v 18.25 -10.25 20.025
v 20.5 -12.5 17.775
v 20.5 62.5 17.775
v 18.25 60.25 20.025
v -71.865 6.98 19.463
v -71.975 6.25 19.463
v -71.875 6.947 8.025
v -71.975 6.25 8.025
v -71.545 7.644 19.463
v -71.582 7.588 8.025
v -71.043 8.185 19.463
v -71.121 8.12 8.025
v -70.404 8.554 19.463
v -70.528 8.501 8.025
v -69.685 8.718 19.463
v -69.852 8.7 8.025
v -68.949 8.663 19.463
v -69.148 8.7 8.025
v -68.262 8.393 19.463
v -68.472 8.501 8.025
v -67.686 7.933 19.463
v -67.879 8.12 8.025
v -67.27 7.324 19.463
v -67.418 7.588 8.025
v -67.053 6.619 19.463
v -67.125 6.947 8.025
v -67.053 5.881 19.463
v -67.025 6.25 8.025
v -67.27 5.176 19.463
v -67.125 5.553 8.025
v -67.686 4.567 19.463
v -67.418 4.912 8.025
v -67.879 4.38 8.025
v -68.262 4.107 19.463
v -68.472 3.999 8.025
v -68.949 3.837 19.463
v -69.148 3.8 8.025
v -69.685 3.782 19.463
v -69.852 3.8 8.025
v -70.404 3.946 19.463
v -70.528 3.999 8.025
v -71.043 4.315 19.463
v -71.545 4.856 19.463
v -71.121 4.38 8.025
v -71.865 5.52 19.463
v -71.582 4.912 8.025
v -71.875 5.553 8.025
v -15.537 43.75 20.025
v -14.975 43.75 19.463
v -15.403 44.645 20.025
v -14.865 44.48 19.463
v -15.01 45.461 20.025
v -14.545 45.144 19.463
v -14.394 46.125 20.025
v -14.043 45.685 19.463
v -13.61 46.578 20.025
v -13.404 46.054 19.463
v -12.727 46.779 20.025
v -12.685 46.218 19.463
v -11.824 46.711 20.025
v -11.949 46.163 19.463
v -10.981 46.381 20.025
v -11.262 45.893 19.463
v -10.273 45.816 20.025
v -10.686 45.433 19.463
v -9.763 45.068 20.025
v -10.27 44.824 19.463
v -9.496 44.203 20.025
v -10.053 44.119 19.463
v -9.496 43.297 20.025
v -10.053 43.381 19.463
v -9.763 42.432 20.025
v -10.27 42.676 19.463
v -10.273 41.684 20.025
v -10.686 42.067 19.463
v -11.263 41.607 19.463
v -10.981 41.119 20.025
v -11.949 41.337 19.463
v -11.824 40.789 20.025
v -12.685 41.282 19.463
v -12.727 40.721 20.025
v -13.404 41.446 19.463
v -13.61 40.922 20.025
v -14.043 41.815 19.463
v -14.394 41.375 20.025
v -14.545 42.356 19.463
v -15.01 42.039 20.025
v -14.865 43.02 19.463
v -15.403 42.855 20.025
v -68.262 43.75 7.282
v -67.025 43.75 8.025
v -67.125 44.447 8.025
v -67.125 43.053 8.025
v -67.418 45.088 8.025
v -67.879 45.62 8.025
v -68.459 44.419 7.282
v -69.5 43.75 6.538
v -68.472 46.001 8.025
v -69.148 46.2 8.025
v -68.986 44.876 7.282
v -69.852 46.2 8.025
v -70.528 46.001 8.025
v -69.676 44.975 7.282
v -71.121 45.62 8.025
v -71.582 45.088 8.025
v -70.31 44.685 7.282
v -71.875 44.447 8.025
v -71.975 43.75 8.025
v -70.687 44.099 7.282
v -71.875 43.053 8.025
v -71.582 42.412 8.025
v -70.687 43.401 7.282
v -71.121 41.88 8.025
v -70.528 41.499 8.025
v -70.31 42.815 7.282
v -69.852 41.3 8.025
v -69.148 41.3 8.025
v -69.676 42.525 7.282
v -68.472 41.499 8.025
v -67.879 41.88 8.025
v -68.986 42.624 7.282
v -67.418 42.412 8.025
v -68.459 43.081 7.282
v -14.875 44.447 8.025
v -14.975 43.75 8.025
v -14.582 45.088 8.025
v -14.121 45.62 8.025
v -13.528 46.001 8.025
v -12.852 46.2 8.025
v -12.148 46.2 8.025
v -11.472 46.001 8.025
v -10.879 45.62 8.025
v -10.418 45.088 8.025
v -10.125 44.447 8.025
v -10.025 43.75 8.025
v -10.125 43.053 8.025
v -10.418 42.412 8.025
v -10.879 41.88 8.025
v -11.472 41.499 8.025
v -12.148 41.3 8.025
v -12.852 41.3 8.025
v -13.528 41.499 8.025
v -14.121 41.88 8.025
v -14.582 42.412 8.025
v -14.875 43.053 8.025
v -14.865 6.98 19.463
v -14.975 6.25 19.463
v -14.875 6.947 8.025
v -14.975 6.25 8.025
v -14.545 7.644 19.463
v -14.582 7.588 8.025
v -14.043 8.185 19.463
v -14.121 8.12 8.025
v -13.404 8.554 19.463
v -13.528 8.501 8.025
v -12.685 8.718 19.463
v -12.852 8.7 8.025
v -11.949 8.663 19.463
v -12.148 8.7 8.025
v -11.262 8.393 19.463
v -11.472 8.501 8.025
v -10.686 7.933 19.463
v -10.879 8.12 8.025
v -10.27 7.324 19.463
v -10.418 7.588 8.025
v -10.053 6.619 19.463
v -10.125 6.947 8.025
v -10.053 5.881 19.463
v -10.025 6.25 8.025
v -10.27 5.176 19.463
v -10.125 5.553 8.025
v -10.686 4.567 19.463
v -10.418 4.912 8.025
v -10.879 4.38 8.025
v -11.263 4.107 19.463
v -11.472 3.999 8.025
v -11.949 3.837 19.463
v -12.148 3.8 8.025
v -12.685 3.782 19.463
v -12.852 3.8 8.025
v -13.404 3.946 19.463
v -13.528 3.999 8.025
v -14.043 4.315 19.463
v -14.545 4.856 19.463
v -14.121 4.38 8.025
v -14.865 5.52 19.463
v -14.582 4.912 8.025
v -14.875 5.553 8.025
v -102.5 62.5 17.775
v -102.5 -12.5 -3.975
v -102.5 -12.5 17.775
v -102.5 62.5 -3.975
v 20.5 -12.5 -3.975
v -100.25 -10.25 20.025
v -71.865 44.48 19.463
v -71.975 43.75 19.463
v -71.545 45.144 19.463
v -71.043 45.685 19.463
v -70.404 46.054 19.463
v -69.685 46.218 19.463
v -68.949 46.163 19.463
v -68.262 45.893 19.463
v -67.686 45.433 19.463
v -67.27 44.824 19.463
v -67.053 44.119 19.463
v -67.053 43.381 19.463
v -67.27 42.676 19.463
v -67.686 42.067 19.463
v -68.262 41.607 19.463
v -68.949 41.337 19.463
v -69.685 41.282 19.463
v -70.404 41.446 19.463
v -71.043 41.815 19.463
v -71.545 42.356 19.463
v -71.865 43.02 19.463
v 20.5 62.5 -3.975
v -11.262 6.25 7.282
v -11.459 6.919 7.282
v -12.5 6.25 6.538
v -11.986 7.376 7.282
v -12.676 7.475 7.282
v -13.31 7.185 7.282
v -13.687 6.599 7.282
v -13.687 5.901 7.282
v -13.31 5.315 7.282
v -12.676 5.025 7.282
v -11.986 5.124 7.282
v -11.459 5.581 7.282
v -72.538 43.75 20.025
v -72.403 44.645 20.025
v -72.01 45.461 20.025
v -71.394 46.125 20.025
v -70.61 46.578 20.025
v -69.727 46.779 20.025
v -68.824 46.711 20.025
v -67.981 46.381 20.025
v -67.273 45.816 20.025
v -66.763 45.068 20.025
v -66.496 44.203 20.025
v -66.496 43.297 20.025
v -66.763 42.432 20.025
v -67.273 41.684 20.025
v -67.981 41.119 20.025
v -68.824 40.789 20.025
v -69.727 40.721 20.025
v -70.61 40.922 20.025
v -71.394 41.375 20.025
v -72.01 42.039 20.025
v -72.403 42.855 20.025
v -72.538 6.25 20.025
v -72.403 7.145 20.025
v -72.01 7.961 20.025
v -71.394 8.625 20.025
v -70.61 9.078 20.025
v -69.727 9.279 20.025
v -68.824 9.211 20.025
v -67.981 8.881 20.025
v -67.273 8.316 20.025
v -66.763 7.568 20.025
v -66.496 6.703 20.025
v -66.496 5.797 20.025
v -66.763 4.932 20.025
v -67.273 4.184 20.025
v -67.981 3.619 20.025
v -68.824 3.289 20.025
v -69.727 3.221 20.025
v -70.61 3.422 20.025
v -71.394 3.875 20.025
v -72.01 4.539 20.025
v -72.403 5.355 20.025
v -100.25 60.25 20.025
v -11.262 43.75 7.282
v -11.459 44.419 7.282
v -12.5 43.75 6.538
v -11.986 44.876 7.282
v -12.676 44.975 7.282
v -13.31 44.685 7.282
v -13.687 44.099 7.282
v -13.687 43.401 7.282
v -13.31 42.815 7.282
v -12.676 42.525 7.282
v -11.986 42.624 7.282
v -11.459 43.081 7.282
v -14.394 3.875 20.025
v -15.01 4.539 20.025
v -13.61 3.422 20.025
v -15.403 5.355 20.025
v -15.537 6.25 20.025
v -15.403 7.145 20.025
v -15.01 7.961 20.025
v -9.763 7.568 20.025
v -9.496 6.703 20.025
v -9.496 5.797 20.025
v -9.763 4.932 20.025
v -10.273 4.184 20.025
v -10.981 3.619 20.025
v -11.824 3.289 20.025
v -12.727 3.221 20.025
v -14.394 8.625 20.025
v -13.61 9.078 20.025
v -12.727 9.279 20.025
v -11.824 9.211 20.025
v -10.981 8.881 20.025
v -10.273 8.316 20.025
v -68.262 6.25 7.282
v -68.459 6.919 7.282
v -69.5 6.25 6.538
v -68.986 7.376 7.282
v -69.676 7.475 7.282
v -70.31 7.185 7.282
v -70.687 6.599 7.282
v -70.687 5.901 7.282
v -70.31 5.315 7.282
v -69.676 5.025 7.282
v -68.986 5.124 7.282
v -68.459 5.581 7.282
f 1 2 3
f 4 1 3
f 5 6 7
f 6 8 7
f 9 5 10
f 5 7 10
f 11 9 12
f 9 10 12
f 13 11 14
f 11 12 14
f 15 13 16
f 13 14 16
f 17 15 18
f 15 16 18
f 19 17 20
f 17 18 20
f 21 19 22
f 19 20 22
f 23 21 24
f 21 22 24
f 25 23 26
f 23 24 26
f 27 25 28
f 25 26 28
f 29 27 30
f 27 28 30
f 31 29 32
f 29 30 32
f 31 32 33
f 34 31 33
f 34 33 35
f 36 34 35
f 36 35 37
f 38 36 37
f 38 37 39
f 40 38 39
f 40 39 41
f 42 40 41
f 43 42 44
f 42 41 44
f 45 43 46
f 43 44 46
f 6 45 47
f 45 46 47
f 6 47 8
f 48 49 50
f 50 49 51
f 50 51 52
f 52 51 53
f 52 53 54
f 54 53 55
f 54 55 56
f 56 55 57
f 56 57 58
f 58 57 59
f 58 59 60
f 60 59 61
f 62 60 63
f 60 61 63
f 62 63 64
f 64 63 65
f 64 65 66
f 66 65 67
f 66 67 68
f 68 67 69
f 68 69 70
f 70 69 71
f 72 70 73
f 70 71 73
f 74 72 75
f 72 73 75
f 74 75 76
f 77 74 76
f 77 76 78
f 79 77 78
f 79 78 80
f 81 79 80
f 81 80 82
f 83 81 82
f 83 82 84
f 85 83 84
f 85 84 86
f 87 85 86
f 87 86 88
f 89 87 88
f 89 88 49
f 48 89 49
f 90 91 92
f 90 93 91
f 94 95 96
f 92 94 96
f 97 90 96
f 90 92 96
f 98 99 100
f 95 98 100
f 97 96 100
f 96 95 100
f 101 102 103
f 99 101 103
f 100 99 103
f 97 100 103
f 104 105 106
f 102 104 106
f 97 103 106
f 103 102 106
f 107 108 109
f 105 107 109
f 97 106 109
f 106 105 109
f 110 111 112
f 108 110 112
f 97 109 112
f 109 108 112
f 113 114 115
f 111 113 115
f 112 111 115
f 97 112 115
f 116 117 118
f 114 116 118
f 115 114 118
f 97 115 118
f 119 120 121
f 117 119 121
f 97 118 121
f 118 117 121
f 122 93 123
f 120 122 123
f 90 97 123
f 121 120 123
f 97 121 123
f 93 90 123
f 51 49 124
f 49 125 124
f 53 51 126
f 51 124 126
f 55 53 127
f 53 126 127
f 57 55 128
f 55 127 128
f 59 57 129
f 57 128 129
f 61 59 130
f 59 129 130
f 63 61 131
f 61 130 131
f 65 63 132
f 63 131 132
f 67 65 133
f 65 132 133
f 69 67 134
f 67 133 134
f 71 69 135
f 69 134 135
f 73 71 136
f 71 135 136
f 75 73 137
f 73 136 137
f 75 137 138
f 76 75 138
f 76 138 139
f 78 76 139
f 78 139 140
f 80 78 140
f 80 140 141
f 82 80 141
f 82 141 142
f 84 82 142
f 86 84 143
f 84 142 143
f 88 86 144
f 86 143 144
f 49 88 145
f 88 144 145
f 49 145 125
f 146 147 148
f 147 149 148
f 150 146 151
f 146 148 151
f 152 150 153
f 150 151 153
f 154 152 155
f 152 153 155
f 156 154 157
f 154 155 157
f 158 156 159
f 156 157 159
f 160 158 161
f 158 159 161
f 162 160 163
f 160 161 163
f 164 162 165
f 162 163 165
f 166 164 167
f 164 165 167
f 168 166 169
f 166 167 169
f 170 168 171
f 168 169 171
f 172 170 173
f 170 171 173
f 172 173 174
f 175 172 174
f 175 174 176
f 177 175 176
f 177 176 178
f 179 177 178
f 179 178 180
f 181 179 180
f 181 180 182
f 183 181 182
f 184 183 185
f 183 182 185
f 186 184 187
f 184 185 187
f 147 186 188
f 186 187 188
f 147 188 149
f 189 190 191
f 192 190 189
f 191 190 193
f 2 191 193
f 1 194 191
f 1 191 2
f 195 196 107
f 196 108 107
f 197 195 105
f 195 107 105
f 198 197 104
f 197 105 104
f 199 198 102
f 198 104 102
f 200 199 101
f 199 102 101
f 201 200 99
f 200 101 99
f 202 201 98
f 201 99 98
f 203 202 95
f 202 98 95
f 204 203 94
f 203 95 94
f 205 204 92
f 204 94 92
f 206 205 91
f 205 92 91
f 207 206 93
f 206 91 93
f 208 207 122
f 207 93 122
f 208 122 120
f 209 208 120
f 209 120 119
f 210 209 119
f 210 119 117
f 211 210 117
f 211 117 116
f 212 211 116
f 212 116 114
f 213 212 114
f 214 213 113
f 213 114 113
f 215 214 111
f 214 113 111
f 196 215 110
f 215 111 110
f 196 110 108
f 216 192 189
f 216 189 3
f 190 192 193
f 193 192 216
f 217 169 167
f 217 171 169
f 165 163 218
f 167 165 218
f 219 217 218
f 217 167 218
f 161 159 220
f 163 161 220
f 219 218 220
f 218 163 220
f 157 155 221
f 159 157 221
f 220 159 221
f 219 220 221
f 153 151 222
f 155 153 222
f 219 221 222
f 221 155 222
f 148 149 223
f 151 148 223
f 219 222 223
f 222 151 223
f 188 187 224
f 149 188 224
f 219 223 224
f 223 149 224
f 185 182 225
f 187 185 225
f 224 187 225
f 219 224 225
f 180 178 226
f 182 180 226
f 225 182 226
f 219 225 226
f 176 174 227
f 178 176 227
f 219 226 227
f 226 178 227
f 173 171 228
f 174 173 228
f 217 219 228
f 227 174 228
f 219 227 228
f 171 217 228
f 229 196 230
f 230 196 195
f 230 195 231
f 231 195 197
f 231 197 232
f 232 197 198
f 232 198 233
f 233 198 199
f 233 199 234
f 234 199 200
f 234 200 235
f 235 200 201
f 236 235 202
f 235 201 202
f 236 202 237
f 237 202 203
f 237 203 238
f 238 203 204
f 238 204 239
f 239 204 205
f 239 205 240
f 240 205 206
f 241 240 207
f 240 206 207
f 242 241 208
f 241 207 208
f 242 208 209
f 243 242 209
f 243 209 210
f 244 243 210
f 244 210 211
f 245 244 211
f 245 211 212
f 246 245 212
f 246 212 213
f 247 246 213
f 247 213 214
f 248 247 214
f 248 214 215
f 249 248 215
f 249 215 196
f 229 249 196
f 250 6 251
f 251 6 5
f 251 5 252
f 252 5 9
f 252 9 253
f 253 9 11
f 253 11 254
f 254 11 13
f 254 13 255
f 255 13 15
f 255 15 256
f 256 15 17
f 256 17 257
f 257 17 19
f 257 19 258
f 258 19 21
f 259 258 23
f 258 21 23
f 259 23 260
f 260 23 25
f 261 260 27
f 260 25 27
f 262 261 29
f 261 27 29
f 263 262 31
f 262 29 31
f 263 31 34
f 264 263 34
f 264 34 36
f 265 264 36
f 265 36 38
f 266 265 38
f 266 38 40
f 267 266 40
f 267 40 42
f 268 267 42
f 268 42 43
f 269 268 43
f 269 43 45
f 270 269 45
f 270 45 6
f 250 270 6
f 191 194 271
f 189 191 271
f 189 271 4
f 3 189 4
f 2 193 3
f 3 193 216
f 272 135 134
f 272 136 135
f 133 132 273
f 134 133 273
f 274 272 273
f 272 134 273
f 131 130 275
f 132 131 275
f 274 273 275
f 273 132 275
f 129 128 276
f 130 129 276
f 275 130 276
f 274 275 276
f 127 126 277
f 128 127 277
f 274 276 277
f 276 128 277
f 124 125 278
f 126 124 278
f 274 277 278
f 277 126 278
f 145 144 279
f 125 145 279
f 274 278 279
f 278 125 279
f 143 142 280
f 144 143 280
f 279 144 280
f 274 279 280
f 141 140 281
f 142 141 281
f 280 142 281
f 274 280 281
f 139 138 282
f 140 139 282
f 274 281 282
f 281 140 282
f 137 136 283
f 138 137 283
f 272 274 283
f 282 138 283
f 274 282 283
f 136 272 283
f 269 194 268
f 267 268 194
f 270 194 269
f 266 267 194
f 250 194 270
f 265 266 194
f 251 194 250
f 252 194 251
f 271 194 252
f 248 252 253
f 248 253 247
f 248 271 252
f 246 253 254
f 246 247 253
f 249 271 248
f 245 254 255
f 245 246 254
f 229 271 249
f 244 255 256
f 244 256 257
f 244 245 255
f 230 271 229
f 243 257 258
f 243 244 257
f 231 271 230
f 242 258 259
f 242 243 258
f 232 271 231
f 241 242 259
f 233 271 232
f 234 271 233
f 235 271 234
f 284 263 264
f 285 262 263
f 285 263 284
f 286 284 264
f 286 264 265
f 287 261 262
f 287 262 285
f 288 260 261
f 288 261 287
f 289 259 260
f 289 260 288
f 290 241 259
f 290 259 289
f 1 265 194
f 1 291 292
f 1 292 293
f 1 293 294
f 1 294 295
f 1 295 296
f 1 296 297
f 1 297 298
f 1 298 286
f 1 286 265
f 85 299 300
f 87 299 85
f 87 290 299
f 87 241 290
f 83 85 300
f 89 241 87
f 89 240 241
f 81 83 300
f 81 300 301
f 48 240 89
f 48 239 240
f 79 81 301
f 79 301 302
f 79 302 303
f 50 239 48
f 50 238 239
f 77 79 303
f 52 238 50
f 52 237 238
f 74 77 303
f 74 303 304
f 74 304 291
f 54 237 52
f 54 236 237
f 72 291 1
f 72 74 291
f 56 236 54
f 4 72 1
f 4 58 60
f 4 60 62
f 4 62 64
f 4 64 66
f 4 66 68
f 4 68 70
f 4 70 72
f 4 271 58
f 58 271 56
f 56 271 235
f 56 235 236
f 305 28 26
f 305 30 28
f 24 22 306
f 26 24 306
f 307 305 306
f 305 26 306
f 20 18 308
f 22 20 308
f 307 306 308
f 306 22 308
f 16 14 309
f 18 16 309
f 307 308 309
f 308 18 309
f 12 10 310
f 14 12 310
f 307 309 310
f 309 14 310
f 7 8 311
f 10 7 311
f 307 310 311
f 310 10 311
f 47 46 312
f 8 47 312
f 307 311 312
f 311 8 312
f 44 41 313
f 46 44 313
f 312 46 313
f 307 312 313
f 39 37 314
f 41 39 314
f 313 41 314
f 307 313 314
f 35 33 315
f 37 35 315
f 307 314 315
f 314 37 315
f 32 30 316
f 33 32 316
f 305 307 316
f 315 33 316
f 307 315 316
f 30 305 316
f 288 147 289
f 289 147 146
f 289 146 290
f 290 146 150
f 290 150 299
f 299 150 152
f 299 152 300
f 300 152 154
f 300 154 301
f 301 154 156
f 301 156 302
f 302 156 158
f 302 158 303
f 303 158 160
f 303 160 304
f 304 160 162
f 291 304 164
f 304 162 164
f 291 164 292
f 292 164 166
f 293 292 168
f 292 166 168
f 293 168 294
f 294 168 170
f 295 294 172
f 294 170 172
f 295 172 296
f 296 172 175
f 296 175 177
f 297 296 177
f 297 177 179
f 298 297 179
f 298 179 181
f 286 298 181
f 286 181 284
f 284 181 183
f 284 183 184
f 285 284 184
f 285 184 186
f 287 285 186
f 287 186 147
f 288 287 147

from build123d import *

# Parameters (mm, degrees)
SKETCH1_W                   = 82
SKETCH1_H                   = 50
BOSS_EXTRUDE4_DEPTH         = 16
M4_TAPPED_HOLE1_D           = 3.3
M4_TAPPED_HOLE1_DEPTH       = 8
M4_TAPPED_HOLE1_CSINK_D     = 4.05
M4_TAPPED_HOLE1_CSINK_ANGLE = 90
M4_TAPPED_HOLE1_TIP         = 0.991420021
CHAMFER1_SIZE               = 1.5
SCALE1_SCALE                = 1.5


with BuildPart() as part:
    # Sketch1 → Boss-Extrude4 (new body)
    with BuildSketch(Plane.XY):
        with Locations((-41, 25)):
            Rectangle(SKETCH1_W, SKETCH1_H)
    extrude(amount=BOSS_EXTRUDE4_DEPTH)

    # M4 Tapped Hole1
    with Locations(Plane.XY.offset(16)):
        with Locations((-60, 37.5), (-60, 12.5), (-22, 12.5), (-22, 37.5)):
            CounterSinkHole(M4_TAPPED_HOLE1_D / 2, M4_TAPPED_HOLE1_CSINK_D / 2, depth=M4_TAPPED_HOLE1_DEPTH, counter_sink_angle=M4_TAPPED_HOLE1_CSINK_ANGLE)
            with Locations((0, 0, -(M4_TAPPED_HOLE1_DEPTH + M4_TAPPED_HOLE1_TIP / 2))):  # 118° drill point
                Cone(0, M4_TAPPED_HOLE1_D / 2, M4_TAPPED_HOLE1_TIP, mode=Mode.SUBTRACT)

    # Chamfer1
    chamfer1_edges = [part.edges().sort_by_distance(p)[0] for p in [
        (-82, 25, 16),
        (-41, 0, 16),
        (0, 25, 16),
        (-41, 50, 16),
    ]]
    chamfer(chamfer1_edges, length=CHAMFER1_SIZE)


with BuildPart() as part_1:
    # Scale1: scaled about (-41, 25, 7.949093999)
    add(part.part.scale(SCALE1_SCALE).moved(Location((20.5, -12.5, -3.974546999))))


solid = part_1.part
